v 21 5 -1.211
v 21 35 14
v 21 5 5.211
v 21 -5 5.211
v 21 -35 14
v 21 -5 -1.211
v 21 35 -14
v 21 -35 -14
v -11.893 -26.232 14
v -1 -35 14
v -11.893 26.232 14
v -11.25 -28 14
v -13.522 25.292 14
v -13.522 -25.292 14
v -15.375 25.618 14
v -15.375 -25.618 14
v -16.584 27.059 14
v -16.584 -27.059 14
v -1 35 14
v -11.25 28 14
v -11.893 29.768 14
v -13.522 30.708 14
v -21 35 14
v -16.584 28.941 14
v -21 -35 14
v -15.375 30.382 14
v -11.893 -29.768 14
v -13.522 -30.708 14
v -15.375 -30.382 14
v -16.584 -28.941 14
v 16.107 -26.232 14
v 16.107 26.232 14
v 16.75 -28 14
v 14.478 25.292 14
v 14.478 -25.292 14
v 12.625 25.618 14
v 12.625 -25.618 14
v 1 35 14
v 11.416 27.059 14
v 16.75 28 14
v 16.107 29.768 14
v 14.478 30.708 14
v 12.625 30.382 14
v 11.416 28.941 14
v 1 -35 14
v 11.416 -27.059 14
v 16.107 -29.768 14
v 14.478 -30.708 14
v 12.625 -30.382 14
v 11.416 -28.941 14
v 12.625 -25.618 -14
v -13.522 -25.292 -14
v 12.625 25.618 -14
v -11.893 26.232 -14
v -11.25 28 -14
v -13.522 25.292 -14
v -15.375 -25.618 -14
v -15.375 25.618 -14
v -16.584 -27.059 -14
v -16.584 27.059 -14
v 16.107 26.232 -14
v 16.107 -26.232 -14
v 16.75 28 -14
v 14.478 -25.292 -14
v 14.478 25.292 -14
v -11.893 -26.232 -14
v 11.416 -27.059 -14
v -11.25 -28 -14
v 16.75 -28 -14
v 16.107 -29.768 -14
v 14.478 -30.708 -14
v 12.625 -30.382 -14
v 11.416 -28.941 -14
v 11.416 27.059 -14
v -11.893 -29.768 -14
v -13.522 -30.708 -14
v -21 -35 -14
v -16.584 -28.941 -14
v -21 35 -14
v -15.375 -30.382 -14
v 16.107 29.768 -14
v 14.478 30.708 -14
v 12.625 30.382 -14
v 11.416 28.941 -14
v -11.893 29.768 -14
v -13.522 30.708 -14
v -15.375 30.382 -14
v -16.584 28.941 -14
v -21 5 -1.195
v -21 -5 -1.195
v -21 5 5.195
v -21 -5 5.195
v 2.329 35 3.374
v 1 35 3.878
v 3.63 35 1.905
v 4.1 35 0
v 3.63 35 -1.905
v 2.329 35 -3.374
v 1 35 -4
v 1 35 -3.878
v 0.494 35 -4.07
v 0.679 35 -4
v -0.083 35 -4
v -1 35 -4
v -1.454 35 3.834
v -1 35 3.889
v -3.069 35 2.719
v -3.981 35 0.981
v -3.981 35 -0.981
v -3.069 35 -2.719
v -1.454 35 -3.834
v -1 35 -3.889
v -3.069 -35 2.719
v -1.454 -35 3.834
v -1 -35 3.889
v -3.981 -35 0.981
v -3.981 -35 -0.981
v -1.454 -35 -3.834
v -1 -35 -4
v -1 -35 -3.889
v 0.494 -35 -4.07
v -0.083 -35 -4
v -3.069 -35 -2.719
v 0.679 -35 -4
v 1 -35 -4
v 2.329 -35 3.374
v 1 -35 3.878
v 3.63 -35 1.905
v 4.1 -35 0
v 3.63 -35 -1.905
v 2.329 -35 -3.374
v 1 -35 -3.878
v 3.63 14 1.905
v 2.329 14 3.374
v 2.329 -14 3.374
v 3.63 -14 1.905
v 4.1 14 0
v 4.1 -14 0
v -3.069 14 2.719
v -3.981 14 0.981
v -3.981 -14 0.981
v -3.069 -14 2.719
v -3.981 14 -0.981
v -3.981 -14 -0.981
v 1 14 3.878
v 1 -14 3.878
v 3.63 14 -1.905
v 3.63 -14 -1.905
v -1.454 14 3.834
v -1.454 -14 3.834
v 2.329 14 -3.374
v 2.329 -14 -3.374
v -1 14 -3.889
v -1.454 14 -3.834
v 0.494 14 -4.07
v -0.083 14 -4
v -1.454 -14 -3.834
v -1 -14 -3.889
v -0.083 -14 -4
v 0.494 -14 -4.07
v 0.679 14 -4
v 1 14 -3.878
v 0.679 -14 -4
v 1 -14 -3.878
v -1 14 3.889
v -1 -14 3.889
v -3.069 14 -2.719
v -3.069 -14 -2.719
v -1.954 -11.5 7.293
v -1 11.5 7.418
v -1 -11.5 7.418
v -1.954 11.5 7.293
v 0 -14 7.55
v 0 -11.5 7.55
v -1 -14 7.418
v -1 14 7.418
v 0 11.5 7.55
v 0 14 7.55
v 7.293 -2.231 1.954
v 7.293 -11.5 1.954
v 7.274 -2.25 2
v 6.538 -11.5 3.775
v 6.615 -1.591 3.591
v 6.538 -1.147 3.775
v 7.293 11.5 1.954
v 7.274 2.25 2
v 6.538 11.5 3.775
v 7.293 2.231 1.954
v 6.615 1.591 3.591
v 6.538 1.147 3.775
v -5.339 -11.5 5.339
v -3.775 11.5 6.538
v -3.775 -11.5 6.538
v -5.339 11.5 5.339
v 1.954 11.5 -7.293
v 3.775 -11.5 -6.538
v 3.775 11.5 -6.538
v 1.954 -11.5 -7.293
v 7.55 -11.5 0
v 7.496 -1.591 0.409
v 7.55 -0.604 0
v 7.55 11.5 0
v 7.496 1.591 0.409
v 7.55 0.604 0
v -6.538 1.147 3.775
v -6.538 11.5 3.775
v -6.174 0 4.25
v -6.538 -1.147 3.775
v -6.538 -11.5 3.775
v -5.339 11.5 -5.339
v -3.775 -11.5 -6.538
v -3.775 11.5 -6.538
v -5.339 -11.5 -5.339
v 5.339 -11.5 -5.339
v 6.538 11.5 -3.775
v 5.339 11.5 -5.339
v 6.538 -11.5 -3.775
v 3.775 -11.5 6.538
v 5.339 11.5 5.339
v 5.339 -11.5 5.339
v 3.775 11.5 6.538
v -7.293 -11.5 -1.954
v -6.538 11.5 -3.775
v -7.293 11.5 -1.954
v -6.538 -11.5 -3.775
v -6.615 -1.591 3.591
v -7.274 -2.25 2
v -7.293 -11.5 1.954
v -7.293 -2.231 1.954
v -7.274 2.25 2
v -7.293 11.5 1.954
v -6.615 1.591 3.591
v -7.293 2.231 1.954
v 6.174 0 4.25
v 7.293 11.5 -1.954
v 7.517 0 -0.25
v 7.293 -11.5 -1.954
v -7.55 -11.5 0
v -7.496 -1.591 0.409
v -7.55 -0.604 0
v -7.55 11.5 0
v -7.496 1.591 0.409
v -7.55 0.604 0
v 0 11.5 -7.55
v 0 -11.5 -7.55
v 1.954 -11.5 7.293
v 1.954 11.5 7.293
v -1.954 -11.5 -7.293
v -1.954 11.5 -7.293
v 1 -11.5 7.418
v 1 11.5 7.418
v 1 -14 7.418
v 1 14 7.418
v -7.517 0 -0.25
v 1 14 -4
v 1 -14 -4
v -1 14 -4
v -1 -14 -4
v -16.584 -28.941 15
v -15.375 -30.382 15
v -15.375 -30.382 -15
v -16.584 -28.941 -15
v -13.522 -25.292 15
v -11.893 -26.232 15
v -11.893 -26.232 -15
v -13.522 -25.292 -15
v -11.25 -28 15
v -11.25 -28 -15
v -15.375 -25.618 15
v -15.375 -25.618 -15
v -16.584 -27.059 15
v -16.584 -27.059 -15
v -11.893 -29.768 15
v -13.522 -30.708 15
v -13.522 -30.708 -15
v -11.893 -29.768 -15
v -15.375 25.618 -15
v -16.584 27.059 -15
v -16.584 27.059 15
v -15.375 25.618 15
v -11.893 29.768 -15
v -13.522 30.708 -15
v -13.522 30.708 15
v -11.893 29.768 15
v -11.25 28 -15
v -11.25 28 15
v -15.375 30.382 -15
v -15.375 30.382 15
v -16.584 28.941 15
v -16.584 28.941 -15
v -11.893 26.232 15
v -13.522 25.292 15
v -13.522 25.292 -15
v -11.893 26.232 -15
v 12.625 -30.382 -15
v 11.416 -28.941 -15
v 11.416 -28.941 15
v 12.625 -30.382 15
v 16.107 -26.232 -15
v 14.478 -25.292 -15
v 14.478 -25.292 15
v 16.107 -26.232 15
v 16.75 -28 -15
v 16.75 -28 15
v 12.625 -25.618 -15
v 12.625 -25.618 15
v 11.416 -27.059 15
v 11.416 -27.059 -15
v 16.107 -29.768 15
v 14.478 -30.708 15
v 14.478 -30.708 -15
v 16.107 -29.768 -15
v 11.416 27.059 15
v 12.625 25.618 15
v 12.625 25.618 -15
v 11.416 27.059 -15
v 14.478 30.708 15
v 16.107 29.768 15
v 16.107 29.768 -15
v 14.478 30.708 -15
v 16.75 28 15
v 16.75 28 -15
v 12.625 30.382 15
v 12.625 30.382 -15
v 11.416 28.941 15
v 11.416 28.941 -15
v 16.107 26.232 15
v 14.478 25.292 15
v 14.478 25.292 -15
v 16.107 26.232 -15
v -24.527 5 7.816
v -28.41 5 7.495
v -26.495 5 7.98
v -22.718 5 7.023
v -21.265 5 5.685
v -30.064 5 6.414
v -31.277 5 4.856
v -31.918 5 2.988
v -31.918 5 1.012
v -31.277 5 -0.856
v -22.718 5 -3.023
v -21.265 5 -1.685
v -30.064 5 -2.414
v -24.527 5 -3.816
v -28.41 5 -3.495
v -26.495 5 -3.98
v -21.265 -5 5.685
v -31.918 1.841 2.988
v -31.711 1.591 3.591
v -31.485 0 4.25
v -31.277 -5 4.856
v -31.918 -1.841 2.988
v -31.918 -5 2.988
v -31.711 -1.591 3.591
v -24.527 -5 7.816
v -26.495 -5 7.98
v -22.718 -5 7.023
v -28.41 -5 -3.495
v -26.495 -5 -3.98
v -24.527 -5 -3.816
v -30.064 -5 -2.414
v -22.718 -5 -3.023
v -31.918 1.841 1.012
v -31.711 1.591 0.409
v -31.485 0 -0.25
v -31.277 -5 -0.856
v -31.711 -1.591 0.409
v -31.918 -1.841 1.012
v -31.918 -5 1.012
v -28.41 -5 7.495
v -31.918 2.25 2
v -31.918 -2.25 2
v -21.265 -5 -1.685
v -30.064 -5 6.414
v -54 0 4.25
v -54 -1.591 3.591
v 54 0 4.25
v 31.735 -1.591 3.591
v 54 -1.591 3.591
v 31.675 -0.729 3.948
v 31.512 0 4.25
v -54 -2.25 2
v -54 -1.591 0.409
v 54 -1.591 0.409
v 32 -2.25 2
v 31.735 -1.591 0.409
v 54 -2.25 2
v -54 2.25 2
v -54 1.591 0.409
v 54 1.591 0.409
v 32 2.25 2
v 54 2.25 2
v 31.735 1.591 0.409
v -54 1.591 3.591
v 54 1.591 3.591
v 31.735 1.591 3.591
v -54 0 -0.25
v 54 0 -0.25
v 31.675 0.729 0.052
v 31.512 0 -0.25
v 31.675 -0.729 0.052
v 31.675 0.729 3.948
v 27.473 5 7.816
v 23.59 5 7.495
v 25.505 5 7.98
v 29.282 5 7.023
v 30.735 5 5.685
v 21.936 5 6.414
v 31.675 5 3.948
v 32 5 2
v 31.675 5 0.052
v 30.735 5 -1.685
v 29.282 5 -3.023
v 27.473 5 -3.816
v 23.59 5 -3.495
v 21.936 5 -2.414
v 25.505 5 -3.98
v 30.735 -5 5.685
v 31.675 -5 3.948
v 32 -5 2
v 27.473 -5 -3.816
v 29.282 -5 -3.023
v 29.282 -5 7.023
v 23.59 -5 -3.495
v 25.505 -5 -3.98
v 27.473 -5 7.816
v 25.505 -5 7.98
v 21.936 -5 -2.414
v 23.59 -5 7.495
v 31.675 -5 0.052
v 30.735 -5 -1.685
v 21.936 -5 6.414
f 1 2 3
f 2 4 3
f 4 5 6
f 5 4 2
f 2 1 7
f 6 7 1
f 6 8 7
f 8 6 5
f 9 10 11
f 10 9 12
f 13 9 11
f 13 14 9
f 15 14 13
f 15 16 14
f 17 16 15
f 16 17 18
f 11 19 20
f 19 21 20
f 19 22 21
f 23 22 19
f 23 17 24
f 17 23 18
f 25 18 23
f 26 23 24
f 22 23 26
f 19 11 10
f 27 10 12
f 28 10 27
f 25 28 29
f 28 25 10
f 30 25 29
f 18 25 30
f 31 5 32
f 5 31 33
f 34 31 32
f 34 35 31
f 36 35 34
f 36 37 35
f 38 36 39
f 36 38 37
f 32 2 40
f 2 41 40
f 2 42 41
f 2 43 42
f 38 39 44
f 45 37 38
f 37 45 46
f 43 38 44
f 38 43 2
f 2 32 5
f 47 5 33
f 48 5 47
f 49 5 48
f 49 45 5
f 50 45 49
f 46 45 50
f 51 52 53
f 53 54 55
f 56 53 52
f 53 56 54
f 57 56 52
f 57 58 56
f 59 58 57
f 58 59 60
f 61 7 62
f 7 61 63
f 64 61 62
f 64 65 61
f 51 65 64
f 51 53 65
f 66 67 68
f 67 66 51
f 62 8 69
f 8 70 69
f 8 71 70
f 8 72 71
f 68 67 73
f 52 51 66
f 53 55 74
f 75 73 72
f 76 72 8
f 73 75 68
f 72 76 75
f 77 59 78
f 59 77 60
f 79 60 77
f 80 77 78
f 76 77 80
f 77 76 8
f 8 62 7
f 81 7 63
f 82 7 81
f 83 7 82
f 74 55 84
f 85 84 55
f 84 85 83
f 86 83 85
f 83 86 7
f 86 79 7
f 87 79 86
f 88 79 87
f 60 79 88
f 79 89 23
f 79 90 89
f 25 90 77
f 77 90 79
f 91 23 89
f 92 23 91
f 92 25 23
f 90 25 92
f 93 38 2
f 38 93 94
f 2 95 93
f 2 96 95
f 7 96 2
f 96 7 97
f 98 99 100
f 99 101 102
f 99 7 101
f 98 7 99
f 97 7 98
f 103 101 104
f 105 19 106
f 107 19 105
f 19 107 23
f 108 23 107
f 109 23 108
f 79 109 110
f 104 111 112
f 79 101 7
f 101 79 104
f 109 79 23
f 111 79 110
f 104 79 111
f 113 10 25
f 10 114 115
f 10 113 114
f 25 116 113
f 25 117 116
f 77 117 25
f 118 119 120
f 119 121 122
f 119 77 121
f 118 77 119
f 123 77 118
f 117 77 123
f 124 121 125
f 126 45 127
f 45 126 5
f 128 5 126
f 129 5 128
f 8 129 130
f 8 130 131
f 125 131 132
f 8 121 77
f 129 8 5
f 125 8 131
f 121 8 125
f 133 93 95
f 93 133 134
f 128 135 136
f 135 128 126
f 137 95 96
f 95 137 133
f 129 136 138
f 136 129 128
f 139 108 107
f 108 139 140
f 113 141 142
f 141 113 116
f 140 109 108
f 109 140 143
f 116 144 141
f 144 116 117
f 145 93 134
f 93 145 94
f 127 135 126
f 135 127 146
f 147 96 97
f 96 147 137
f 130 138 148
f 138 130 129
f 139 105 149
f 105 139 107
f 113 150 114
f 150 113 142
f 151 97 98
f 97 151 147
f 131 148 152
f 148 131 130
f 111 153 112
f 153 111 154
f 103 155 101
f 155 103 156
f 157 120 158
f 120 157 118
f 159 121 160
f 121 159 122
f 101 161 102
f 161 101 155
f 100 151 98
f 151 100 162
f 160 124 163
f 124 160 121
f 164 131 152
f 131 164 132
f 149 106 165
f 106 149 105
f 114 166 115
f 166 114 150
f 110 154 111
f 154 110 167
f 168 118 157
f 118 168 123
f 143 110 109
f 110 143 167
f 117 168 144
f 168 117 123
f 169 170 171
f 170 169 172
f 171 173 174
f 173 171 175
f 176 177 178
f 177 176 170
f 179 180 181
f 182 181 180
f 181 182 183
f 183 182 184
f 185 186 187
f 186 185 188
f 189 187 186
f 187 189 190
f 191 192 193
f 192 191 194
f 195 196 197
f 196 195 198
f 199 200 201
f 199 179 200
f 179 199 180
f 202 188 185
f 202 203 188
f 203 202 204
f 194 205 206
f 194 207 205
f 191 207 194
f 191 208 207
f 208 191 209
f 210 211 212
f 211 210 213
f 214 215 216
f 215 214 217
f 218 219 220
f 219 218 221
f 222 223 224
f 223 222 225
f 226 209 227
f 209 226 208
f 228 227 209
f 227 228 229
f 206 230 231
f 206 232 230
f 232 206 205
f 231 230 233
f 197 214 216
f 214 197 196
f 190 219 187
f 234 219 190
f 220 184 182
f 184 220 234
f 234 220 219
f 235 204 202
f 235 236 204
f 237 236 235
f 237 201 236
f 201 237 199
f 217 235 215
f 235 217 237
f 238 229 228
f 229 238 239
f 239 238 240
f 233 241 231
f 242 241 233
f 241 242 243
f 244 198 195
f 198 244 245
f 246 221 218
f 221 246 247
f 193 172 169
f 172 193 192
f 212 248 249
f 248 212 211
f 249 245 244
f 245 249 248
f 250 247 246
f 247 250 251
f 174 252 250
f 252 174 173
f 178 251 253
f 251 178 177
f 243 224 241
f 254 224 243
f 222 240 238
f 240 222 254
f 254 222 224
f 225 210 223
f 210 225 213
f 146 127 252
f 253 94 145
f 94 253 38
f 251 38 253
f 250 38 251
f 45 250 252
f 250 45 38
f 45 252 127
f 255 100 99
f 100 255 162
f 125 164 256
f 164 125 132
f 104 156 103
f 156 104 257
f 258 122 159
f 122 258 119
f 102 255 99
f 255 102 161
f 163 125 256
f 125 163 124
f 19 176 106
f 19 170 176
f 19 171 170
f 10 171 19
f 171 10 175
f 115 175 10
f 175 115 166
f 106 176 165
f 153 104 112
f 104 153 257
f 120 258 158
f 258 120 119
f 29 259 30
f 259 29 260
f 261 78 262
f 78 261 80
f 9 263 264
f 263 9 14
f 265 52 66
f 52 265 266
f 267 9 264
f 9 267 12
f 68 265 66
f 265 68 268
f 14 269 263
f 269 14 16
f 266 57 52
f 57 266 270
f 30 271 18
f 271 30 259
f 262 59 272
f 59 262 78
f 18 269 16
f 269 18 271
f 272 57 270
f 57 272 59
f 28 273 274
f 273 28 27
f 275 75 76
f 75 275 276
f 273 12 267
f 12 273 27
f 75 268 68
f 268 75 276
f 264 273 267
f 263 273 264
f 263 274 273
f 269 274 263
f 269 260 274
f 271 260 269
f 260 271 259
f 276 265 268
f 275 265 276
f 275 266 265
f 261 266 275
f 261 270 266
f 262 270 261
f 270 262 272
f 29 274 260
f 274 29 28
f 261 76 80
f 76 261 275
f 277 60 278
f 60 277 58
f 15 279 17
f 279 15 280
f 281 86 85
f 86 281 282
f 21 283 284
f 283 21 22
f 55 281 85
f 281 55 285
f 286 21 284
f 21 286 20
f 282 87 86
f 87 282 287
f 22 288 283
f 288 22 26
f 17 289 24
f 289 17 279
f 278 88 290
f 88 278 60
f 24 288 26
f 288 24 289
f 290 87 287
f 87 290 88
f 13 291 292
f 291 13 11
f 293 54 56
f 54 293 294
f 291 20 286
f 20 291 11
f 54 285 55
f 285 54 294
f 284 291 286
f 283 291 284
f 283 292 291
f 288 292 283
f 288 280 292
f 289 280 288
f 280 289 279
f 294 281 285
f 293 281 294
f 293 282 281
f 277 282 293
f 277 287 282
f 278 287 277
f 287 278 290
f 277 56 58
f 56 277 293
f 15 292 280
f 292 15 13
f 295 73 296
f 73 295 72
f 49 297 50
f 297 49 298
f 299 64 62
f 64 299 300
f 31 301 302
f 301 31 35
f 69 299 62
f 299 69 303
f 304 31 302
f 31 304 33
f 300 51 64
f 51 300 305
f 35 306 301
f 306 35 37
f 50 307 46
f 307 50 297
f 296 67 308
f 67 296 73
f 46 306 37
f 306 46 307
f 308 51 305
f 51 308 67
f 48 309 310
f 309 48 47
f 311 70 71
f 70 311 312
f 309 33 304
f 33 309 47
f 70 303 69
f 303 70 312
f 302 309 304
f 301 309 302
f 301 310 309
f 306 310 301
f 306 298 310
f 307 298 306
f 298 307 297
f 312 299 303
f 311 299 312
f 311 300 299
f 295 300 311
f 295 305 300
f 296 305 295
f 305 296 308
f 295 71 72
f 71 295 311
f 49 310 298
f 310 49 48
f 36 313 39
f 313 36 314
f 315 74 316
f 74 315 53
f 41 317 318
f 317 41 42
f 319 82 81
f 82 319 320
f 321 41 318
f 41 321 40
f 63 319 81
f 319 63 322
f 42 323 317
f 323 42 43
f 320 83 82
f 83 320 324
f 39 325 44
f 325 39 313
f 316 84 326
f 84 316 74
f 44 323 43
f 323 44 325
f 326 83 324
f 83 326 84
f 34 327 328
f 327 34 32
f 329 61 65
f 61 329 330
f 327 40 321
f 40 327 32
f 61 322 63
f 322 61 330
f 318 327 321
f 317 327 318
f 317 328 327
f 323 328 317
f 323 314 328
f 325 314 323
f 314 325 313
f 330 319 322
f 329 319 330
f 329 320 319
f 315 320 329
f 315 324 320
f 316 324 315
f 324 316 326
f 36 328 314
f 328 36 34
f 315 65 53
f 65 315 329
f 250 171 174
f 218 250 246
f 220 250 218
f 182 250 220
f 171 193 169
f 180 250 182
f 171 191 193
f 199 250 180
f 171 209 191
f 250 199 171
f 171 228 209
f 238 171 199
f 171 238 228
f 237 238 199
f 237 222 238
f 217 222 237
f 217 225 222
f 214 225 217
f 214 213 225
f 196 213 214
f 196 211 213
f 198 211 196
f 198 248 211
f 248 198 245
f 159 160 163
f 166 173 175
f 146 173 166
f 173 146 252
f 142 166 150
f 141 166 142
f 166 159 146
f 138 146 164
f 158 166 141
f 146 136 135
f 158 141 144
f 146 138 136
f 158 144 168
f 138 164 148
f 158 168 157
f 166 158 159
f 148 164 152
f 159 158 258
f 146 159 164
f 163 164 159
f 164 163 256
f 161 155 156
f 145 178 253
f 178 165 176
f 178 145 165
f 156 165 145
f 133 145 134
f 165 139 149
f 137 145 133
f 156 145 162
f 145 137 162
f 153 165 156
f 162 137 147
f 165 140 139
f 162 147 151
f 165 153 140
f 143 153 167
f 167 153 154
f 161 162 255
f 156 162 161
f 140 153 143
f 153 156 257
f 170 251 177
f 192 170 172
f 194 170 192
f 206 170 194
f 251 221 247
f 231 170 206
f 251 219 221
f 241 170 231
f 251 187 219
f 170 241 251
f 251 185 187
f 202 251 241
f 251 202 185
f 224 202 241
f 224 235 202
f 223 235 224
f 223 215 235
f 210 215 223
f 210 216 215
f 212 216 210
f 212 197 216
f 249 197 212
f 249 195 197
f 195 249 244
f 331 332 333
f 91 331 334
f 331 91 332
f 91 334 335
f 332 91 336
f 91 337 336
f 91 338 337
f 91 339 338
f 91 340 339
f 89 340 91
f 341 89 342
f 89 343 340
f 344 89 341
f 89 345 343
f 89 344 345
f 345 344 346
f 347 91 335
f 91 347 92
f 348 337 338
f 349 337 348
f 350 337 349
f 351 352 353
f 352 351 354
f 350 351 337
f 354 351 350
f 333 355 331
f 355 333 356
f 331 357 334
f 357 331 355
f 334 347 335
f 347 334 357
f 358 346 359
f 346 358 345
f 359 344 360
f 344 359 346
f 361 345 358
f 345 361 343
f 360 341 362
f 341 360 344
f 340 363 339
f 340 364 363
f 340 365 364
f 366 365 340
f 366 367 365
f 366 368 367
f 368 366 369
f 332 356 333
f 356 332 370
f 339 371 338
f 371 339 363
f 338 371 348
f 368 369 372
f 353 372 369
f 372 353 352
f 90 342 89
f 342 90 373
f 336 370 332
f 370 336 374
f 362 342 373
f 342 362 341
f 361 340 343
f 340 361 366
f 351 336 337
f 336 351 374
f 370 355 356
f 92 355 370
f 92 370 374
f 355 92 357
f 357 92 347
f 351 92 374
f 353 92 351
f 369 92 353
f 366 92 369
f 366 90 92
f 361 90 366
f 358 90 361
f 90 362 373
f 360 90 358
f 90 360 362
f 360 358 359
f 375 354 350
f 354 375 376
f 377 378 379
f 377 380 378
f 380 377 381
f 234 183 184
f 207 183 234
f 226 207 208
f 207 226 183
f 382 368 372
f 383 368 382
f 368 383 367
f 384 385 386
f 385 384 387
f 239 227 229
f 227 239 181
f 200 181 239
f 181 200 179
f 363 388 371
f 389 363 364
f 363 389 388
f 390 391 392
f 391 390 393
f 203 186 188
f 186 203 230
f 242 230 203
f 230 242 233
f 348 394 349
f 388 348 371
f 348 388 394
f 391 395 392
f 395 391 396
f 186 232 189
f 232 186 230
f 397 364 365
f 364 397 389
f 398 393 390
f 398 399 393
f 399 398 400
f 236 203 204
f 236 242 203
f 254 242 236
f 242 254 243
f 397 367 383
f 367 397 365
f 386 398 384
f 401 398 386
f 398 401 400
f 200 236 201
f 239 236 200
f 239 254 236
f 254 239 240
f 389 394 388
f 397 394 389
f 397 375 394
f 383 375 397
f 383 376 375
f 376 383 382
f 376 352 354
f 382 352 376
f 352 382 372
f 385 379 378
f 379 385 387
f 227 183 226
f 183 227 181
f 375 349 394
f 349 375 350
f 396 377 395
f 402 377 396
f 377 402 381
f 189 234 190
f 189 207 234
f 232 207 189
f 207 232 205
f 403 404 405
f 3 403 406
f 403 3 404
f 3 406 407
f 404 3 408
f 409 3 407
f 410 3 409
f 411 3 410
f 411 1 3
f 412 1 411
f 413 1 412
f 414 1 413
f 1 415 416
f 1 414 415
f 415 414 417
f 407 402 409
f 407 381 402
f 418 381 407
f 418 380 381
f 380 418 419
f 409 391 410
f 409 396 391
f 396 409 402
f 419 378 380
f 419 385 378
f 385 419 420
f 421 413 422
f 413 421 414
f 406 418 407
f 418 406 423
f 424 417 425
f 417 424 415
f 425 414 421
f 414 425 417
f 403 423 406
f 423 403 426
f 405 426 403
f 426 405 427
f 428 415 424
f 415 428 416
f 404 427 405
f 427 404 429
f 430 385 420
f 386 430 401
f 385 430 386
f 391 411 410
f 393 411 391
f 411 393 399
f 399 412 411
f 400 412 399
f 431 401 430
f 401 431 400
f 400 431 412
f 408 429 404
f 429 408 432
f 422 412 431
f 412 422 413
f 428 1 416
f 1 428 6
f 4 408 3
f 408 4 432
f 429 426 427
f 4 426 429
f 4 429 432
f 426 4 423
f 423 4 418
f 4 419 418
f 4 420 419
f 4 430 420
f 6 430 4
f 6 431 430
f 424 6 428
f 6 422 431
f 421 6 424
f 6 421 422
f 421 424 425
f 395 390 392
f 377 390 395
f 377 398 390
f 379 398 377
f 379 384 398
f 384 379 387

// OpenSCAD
// Parameters
shaft_diameter_mm = 8; //[4:16:0.1]
block_width_mm = 42; //[21:84:0.5]
block_length_mm = 70; //[35:140:0.5]
block_height_mm = 28; //[14:56:0.5]
bearing_outer_diameter_mm = 15; //[10:30:0.1]
bearing_length_mm = 24; //[12:48:0.5]
bearing_seat_clearance_mm = 0.1; //[0:0.4:0.01]
shaft_clearance_mm = 0.2; //[0:0.6:0.01]
mounting_hole_diameter_mm = 5.5; //[3:8:0.1]
counterbore_diameter_mm = 10; //[6:16:0.1]
counterbore_depth_mm = 4; //[2:10:0.1]
edge_margin_mm = 7; //[4:14:0.5]
retention_shoulder_depth_mm = 1.5; //[0.5:4:0.1]
bore_overlap_mm = 1; //[0.5:2:0.1]
clamp_style_split = 1; //[0:1:1]
clamp_slot_width_mm = 2; //[0.5:4:0.1]
clamp_slot_height_mm = 18; //[8:26:0.5]
clamp_screw_diameter_mm = 4.5; //[3:6:0.1]
clamp_boss_diameter_mm = 12; //[8:20:0.5]
clamp_boss_length_mm = 10; //[6:20:0.5]

// SBR Bearing Block Assembly
module sbr_bearing_block_assembly() {
  color("Silver") {
    // Block body
    difference() {
      cube([block_width_mm, block_length_mm, block_height_mm], center=true);
      // Shaft bore
      translate([0, 0, 0])
        rotate([90, 0, 0])
        cylinder(h=block_length_mm + 2*bore_overlap_mm, r=(shaft_diameter_mm + shaft_clearance_mm)/2, center=true);
      // Bearing seat
      translate([0, 0, 0])
        rotate([90, 0, 0])
        cylinder(h=bearing_length_mm + 2*bore_overlap_mm, r=(bearing_outer_diameter_mm + bearing_seat_clearance_mm)/2, center=true);
      // Split clamp slot
      if (clamp_style_split == 1) {
        translate([0, 0, block_height_mm/2 - clamp_slot_height_mm/2])
          cube([clamp_slot_width_mm, block_length_mm + 2*bore_overlap_mm, clamp_slot_height_mm], center=true);
      }
    }
    // Mounting holes
    for (x = [-1, 1], y = [-1, 1]) {
      translate([x * (block_width_mm/2 - edge_margin_mm), y * (block_length_mm/2 - edge_margin_mm), 0])
        cylinder(h=block_height_mm + 2*bore_overlap_mm, r=mounting_hole_diameter_mm/2, center=true);
      translate([x * (block_width_mm/2 - edge_margin_mm), y * (block_length_mm/2 - edge_margin_mm), -(block_height_mm/2) + (counterbore_depth_mm + bore_overlap_mm)/2])
        cylinder(h=counterbore_depth_mm + bore_overlap_mm, r=counterbore_diameter_mm/2, center=true);
    }
    // Retention shoulders
    for (y = [-1, 1]) {
      translate([0, y * (bearing_length_mm/2 + retention_shoulder_depth_mm/2), 0])
        rotate([90, 0, 0])
        cylinder(h=retention_shoulder_depth_mm + bore_overlap_mm, r=(bearing_outer_diameter_mm + bearing_seat_clearance_mm)/2, center=true);
    }
    // Clamp bosses
    if (clamp_style_split == 1) {
      for (x = [-1, 1]) {
        translate([x * (block_width_mm/2 + clamp_boss_diameter_mm/2 - bore_overlap_mm), 0, block_height_mm/2 - clamp_slot_height_mm + clamp_boss_diameter_mm/2])
          rotate([90, 0, 0])
          cylinder(h=clamp_boss_length_mm, r=clamp_boss_diameter_mm/2, center=true);
        translate([x * (block_width_mm/2 + clamp_boss_diameter_mm/2 - bore_overlap_mm), 0, block_height_mm/2 - clamp_slot_height_mm + clamp_boss_diameter_mm/2])
          rotate([0, 90, 0])
          cylinder(h=clamp_boss_diameter_mm + block_width_mm + 2*bore_overlap_mm, r=clamp_screw_diameter_mm/2, center=true);
      }
    }
  }
}

// SCS Bearing Block
module scs_bearing_block() {
  color("DimGray") {
    // Placeholder for SCS bearing block geometry
    // Implement detailed geometry based on specifications
  }
}

// SBR Bearing Block
module sbr_bearing_block() {
  color("Black") {
    // Placeholder for SBR bearing block geometry
    // Implement detailed geometry based on specifications
  }
}

// SCS Bearing Block Hole Positions
module scs_bearing_block_hole_positions() {
  color("White") {
    // Placeholder for SCS bearing block hole positions
    // Implement detailed geometry based on specifications
  }
}

// Assembly
module assembly() {
  sbr_bearing_block_assembly();
  translate([0, 0, block_height_mm + 10]) scs_bearing_block();
  translate([0, 0, block_height_mm + 20]) sbr_bearing_block();
  translate([0, 0, block_height_mm + 30]) scs_bearing_block_hole_positions();
}

assembly();
